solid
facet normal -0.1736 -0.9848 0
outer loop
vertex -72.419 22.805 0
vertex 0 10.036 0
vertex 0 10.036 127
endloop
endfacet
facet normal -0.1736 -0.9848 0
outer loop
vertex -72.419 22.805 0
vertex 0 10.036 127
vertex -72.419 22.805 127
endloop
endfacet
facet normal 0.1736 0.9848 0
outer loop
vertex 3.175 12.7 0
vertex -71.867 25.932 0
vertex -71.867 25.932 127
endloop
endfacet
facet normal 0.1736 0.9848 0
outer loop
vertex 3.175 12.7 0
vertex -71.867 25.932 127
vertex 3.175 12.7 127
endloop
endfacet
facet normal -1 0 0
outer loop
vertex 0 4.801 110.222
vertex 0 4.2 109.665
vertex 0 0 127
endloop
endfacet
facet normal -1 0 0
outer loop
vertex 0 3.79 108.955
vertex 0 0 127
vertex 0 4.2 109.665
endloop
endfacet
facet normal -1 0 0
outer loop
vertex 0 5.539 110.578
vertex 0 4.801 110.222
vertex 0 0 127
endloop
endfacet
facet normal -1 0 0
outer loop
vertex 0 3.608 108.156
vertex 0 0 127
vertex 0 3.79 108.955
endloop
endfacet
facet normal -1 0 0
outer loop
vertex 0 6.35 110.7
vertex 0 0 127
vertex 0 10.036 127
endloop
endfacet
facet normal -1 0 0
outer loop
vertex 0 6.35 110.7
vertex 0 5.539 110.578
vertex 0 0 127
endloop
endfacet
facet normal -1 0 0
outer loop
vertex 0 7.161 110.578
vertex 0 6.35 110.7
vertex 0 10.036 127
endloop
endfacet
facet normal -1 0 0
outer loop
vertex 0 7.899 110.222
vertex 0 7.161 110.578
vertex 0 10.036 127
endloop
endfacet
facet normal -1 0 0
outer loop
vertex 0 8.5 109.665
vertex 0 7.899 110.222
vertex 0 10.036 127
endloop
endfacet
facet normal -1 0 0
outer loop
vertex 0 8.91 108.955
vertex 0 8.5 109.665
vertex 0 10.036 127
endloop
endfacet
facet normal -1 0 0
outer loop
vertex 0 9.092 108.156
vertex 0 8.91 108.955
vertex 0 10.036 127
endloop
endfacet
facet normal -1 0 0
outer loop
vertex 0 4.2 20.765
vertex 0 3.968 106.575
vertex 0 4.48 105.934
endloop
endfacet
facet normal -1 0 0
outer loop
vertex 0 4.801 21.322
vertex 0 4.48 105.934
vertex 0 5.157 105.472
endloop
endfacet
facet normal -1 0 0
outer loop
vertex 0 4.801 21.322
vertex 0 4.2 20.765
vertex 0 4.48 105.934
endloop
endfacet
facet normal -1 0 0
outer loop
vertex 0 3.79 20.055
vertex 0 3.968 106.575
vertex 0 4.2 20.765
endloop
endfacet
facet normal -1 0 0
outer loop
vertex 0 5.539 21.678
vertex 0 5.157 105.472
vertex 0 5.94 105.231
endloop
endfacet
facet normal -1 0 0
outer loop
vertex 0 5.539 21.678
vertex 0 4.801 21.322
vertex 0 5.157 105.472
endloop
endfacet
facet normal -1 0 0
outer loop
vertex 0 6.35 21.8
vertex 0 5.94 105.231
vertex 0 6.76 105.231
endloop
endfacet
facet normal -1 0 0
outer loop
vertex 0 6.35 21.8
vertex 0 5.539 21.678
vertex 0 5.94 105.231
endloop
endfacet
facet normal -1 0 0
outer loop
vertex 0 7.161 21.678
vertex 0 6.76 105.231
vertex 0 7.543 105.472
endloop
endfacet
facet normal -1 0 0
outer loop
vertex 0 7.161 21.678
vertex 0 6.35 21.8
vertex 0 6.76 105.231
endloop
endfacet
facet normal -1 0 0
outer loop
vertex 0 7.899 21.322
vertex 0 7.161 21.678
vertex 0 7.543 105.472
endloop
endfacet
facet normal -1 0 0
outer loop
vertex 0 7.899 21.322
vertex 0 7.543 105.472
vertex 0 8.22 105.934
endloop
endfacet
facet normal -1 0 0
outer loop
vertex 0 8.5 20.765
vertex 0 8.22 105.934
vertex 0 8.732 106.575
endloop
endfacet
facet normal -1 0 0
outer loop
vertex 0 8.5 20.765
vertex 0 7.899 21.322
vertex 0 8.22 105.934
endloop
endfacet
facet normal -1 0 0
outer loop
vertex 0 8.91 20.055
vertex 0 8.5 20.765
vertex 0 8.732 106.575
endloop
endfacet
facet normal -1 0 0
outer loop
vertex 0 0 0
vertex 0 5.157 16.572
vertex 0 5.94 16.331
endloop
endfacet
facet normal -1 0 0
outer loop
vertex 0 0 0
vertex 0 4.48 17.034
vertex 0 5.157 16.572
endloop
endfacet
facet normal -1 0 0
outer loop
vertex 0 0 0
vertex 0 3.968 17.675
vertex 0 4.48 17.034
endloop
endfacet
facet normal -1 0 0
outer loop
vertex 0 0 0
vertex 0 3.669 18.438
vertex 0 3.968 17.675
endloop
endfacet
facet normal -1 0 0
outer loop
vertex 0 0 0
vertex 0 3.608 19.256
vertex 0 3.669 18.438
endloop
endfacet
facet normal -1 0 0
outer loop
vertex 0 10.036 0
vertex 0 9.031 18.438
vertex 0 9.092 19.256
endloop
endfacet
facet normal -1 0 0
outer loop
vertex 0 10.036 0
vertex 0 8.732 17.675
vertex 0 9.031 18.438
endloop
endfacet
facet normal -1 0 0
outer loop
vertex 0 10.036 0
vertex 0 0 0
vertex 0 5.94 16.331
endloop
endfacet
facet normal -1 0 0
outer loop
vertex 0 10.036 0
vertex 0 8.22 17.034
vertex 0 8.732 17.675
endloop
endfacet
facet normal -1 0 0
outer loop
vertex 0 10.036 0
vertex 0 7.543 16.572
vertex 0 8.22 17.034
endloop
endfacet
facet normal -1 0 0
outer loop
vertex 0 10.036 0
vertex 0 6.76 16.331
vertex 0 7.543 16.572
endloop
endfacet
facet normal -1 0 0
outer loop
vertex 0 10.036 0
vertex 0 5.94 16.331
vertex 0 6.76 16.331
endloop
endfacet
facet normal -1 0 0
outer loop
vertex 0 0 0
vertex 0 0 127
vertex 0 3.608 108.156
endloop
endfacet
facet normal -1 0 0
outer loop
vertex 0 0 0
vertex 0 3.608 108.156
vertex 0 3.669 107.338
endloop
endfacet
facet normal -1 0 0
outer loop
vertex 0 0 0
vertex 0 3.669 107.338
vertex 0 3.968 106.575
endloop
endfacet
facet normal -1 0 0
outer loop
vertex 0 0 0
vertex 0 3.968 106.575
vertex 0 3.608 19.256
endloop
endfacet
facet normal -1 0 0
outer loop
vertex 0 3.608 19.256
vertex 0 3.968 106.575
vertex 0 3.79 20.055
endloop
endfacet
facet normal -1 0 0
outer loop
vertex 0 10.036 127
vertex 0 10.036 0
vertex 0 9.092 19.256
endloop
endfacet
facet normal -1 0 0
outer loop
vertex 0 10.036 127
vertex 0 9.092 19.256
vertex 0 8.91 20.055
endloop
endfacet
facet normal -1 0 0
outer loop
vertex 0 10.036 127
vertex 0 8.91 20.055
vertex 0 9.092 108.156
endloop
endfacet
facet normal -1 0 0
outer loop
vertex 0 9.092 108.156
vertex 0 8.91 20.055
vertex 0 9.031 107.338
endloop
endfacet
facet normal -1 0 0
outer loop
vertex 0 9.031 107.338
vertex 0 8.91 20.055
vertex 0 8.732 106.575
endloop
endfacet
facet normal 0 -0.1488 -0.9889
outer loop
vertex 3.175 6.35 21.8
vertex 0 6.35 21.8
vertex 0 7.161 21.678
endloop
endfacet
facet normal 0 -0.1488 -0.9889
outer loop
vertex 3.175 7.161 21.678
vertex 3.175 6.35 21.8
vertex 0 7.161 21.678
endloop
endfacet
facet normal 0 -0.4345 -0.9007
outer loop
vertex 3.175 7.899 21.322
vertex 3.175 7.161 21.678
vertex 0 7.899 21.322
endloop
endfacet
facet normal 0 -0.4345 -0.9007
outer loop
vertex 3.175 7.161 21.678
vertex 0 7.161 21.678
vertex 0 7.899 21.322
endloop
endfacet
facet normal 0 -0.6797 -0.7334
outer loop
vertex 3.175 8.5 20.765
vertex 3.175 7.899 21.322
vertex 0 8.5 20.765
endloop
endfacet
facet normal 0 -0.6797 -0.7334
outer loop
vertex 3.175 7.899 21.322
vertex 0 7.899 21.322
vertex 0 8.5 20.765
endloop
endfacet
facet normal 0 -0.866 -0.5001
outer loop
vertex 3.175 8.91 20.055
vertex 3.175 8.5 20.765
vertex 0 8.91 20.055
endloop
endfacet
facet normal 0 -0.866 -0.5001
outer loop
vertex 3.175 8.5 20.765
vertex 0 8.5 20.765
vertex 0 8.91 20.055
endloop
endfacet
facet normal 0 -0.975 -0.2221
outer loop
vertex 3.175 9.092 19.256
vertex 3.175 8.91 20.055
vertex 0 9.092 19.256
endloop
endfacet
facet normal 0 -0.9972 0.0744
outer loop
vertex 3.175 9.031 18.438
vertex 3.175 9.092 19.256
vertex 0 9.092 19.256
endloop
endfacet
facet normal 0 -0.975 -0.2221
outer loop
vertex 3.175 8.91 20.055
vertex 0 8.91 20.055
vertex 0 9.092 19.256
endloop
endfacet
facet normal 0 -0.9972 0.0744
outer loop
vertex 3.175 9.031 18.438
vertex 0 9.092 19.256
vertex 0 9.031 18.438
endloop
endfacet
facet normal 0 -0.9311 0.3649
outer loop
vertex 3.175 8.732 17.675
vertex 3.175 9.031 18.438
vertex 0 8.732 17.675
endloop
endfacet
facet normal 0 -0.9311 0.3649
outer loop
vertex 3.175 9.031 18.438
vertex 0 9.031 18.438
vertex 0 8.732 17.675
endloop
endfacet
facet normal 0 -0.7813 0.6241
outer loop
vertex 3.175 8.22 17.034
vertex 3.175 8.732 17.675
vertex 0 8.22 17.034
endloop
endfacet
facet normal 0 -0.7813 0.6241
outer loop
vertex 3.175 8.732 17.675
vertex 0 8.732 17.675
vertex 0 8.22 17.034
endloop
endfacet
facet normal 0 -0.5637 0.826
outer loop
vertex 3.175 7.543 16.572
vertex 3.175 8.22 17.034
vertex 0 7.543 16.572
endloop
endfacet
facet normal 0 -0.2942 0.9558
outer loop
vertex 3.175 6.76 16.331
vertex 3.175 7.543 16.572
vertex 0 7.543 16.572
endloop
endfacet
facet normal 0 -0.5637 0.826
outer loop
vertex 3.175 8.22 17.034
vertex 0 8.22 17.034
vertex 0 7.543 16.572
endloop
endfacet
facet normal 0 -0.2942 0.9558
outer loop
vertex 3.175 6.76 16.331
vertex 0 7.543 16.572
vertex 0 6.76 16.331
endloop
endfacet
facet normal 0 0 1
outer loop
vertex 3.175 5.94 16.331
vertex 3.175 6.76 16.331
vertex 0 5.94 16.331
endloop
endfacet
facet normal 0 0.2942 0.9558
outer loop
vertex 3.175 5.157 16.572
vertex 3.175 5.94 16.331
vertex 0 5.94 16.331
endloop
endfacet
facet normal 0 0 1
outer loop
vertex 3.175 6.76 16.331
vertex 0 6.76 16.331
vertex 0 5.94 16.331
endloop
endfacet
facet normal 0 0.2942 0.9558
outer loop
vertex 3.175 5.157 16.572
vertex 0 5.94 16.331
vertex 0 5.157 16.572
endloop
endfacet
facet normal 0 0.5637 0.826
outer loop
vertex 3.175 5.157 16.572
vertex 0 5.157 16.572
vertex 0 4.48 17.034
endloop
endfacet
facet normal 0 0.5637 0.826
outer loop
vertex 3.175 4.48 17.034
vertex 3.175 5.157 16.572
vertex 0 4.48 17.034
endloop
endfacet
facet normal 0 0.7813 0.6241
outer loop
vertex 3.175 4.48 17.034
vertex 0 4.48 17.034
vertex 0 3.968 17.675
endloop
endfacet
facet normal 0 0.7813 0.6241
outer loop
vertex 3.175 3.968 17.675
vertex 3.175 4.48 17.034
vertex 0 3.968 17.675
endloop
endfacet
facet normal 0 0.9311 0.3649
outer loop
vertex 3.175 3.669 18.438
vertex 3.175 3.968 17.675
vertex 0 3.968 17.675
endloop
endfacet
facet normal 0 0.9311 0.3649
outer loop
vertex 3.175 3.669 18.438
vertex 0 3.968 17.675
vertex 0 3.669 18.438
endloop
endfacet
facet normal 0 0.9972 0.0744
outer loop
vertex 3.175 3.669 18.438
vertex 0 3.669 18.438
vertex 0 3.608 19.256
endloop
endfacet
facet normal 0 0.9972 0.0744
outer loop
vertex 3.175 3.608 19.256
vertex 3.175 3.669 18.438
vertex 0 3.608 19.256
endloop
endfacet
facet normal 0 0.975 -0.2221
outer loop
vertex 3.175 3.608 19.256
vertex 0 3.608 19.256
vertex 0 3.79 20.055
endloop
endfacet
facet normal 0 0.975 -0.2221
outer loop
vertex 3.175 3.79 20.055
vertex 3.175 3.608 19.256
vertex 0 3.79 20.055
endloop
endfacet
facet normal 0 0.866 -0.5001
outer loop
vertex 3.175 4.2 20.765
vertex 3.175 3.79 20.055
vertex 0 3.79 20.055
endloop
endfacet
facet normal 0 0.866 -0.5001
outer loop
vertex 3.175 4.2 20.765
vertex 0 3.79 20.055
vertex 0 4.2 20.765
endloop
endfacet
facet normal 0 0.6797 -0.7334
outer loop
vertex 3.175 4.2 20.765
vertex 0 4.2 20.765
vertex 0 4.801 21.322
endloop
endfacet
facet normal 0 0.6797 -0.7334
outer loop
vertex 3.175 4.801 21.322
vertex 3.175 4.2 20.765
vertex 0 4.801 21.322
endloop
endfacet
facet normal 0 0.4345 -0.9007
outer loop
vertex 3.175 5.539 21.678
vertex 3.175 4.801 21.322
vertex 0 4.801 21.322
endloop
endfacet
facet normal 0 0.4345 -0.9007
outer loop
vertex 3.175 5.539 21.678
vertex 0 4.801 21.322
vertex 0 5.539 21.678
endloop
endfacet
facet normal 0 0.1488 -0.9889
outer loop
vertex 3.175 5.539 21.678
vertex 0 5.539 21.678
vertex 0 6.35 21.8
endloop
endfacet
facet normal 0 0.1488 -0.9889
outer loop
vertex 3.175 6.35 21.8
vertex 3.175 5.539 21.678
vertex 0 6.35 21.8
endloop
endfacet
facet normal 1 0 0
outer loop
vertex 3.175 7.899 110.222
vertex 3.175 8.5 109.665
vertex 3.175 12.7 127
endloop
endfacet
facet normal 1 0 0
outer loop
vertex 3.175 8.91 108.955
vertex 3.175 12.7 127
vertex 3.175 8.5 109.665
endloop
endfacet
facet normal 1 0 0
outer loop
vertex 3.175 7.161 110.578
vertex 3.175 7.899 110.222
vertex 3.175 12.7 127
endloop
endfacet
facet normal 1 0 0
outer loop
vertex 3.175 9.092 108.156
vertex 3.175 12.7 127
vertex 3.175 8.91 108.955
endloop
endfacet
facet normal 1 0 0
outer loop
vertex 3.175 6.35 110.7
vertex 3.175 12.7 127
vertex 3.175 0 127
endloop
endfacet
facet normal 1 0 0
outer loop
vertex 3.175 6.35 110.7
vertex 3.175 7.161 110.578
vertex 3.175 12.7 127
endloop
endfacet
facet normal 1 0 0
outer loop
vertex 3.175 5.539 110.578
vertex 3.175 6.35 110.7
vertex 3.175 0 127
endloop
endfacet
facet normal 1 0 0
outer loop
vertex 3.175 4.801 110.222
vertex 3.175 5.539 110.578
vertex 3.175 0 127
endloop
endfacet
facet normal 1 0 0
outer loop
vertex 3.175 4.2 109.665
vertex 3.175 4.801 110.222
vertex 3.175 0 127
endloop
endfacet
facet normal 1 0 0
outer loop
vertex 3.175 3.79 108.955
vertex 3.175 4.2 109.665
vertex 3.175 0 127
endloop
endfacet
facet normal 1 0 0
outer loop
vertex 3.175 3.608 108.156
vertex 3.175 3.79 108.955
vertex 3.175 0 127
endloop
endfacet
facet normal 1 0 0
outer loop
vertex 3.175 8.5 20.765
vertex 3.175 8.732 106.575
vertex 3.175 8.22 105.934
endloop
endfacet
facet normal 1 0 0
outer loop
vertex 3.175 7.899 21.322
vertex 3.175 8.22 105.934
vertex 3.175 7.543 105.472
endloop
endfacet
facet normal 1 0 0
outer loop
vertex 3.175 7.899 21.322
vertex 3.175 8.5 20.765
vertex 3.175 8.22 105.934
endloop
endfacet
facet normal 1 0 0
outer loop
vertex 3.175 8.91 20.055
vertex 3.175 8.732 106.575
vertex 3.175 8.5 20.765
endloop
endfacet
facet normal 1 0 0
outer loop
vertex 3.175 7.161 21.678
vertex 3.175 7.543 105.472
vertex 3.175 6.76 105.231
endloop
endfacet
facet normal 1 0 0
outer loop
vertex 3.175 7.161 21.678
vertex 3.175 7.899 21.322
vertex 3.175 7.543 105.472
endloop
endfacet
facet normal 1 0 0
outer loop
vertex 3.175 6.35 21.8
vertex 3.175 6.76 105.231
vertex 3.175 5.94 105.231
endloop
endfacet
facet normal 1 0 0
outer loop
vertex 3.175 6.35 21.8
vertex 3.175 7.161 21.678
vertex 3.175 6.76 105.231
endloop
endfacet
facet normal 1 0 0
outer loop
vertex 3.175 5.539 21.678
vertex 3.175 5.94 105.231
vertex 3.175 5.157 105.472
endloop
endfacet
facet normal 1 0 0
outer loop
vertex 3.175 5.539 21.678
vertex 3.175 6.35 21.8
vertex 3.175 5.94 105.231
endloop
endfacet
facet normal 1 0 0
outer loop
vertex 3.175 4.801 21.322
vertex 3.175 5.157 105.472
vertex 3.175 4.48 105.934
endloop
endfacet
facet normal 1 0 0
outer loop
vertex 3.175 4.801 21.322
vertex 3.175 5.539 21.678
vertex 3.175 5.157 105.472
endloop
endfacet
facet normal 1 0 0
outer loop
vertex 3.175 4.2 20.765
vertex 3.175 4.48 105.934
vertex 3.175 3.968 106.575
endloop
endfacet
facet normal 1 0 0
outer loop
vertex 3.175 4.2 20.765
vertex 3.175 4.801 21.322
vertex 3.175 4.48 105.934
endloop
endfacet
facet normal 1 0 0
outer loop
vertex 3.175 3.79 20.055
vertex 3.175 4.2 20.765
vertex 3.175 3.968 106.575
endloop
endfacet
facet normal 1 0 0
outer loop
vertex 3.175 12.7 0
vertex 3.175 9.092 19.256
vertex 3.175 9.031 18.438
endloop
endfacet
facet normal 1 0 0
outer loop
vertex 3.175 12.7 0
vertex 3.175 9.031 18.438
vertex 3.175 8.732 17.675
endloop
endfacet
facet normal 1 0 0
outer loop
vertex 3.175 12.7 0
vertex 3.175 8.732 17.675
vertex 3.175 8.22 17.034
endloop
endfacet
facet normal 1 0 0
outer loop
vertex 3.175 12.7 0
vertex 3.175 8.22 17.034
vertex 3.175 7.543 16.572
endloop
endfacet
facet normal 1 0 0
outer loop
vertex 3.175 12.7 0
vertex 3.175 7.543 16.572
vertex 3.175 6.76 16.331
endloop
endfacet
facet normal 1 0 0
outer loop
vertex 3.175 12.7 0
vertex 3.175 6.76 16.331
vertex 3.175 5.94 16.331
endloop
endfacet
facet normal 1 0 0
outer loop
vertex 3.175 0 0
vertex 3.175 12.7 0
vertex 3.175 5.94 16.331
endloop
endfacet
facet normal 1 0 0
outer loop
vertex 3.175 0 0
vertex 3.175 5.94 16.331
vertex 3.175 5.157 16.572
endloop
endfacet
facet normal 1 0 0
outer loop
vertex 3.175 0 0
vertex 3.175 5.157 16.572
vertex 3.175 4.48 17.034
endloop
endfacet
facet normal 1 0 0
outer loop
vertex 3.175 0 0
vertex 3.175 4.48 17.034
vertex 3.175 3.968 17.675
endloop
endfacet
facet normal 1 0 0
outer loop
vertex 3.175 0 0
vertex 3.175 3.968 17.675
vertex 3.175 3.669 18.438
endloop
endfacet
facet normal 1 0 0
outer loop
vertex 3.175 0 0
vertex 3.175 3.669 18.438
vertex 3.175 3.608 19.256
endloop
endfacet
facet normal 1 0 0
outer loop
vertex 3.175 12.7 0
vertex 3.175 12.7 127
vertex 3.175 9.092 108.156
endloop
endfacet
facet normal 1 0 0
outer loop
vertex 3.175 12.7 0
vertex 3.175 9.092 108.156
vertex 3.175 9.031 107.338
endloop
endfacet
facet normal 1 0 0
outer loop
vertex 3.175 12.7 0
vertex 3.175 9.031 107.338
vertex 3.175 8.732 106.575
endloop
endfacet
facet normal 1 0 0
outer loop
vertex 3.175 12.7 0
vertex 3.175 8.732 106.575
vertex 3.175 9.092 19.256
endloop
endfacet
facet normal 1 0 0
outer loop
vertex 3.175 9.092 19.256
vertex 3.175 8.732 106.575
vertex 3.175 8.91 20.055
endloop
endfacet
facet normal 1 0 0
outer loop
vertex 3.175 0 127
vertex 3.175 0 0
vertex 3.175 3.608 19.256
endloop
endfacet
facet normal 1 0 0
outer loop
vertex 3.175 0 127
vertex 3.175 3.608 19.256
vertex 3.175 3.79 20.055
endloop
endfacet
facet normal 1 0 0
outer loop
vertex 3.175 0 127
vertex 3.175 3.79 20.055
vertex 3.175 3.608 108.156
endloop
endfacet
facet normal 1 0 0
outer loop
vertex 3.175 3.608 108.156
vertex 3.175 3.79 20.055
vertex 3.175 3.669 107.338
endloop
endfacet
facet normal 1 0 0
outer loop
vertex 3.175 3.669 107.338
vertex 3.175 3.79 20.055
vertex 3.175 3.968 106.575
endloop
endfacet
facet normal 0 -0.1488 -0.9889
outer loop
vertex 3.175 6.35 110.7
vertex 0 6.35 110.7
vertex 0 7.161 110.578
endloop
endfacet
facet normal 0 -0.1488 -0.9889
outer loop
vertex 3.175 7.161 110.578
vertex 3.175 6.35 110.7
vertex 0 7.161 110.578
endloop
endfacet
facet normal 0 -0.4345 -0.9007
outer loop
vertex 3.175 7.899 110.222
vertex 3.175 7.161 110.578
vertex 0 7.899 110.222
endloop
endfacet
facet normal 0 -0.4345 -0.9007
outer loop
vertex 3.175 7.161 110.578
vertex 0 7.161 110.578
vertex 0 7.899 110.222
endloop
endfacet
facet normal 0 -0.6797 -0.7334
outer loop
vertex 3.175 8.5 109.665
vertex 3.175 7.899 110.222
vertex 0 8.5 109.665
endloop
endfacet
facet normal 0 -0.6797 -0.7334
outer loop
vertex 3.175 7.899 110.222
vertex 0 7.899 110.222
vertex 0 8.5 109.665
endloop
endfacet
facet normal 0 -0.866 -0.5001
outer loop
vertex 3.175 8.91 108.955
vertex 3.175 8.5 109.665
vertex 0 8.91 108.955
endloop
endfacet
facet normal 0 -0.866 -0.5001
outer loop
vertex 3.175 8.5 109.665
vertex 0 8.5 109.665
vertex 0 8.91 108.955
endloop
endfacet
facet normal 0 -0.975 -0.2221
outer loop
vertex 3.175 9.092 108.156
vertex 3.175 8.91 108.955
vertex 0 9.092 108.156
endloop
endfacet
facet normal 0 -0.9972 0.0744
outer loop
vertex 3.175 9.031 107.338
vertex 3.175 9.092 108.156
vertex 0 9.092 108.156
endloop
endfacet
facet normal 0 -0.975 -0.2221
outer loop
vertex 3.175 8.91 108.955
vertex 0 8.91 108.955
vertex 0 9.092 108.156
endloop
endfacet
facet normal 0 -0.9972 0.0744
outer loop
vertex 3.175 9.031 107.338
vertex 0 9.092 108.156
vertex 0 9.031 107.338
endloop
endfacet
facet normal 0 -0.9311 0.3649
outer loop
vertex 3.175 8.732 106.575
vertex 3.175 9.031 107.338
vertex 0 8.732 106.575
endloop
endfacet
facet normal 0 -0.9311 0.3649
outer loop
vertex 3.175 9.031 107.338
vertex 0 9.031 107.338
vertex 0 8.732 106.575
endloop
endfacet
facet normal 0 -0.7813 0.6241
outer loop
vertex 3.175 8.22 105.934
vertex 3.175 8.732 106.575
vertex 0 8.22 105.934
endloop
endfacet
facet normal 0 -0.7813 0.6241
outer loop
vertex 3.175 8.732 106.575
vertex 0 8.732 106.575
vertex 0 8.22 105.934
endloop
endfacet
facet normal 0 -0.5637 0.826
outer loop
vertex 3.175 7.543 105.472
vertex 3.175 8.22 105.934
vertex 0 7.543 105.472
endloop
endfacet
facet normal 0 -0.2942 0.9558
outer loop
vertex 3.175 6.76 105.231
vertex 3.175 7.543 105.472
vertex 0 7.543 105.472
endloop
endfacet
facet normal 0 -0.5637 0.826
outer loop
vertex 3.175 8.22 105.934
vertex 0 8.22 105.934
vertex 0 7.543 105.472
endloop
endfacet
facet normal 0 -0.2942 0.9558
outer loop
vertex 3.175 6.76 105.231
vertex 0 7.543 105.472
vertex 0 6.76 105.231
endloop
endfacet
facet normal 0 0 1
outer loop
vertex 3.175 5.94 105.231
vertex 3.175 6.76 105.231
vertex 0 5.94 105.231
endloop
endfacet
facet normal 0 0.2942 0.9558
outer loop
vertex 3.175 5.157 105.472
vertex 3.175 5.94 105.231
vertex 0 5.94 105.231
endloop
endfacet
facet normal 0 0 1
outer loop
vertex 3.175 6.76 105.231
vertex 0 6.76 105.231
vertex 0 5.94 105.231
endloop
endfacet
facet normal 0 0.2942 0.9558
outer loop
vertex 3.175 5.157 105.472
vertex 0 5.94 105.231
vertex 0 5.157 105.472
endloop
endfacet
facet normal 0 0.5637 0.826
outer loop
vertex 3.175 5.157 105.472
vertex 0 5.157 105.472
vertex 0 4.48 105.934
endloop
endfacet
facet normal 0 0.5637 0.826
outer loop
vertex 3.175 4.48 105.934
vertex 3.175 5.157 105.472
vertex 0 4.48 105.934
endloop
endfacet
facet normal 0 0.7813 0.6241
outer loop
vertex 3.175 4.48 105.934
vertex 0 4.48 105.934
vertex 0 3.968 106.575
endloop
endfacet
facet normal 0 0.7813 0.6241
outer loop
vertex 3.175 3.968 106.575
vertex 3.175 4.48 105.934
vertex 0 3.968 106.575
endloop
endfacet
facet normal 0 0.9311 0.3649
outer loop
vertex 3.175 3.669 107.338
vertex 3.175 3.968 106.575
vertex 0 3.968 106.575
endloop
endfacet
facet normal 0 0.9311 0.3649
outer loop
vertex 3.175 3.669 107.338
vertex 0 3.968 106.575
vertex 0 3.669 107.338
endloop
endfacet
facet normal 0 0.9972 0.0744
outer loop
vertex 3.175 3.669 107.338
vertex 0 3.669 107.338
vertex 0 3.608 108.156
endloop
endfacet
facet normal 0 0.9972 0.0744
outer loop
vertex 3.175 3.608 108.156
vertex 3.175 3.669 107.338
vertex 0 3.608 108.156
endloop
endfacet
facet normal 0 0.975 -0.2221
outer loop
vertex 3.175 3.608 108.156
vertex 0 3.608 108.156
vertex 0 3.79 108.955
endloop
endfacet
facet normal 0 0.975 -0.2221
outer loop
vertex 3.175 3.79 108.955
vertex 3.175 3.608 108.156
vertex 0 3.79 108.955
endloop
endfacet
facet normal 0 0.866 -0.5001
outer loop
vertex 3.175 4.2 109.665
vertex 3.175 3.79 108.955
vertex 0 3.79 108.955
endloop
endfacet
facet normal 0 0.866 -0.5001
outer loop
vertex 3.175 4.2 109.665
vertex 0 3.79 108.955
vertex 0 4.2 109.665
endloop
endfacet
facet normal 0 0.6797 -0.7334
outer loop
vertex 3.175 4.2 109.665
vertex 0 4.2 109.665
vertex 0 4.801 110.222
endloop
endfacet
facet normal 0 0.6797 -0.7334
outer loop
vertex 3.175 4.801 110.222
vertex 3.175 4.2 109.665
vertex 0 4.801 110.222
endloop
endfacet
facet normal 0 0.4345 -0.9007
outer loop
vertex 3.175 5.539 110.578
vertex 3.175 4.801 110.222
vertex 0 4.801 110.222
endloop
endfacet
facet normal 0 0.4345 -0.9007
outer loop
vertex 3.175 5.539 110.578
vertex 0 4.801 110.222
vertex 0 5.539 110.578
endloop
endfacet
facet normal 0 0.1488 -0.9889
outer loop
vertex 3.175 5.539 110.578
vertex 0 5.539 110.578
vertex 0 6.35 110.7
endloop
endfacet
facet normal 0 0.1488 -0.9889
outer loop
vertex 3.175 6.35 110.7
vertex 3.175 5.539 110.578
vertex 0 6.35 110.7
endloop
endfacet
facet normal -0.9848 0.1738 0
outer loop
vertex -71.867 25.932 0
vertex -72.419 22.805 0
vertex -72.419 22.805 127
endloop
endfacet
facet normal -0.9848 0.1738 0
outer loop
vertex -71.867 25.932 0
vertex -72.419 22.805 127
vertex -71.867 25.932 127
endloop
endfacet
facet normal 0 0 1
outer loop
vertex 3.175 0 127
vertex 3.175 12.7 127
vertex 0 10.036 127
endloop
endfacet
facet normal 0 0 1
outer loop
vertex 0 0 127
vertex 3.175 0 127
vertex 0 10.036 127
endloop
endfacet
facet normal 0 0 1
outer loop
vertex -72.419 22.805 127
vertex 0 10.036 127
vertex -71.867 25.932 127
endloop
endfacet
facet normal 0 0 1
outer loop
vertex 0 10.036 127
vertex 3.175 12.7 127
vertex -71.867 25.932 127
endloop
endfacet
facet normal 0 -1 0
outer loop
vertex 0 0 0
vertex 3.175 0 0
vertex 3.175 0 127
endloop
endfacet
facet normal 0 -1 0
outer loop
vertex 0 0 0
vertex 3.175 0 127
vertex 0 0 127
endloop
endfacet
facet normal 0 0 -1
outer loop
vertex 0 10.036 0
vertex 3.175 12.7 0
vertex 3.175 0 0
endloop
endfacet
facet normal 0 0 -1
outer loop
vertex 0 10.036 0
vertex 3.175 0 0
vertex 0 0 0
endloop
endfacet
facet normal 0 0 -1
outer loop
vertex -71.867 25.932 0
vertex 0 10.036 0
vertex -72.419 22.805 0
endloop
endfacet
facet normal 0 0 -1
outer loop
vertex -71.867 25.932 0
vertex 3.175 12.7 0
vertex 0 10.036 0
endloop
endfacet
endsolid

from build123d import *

# Parameters (mm, degrees)
BOSS_EXTRUDE1_DEPTH  = 127
M5_CLEARANCE_HOLE1_D = 5.5


with BuildPart() as part:
    # Sketch1 → Boss-Extrude1 (new body)
    with BuildSketch(Plane.XY):
        Polygon((0, 0), (0, 10.035858671), (-72.418683744, 22.805226522), (-71.86735078, 25.931991138), (3.175, 12.7), (3.175, 0), align=None)
    extrude(amount=BOSS_EXTRUDE1_DEPTH)

    # M5 Clearance Hole1 (through all)
    with Locations(Plane(origin=(3.175, 0, 0), x_dir=(0, 0, -1), z_dir=(1, 0, 0))):
        with Locations((-107.95, 6.35), (-19.05, 6.35)):
            Hole(M5_CLEARANCE_HOLE1_D / 2)


solid = part.part
